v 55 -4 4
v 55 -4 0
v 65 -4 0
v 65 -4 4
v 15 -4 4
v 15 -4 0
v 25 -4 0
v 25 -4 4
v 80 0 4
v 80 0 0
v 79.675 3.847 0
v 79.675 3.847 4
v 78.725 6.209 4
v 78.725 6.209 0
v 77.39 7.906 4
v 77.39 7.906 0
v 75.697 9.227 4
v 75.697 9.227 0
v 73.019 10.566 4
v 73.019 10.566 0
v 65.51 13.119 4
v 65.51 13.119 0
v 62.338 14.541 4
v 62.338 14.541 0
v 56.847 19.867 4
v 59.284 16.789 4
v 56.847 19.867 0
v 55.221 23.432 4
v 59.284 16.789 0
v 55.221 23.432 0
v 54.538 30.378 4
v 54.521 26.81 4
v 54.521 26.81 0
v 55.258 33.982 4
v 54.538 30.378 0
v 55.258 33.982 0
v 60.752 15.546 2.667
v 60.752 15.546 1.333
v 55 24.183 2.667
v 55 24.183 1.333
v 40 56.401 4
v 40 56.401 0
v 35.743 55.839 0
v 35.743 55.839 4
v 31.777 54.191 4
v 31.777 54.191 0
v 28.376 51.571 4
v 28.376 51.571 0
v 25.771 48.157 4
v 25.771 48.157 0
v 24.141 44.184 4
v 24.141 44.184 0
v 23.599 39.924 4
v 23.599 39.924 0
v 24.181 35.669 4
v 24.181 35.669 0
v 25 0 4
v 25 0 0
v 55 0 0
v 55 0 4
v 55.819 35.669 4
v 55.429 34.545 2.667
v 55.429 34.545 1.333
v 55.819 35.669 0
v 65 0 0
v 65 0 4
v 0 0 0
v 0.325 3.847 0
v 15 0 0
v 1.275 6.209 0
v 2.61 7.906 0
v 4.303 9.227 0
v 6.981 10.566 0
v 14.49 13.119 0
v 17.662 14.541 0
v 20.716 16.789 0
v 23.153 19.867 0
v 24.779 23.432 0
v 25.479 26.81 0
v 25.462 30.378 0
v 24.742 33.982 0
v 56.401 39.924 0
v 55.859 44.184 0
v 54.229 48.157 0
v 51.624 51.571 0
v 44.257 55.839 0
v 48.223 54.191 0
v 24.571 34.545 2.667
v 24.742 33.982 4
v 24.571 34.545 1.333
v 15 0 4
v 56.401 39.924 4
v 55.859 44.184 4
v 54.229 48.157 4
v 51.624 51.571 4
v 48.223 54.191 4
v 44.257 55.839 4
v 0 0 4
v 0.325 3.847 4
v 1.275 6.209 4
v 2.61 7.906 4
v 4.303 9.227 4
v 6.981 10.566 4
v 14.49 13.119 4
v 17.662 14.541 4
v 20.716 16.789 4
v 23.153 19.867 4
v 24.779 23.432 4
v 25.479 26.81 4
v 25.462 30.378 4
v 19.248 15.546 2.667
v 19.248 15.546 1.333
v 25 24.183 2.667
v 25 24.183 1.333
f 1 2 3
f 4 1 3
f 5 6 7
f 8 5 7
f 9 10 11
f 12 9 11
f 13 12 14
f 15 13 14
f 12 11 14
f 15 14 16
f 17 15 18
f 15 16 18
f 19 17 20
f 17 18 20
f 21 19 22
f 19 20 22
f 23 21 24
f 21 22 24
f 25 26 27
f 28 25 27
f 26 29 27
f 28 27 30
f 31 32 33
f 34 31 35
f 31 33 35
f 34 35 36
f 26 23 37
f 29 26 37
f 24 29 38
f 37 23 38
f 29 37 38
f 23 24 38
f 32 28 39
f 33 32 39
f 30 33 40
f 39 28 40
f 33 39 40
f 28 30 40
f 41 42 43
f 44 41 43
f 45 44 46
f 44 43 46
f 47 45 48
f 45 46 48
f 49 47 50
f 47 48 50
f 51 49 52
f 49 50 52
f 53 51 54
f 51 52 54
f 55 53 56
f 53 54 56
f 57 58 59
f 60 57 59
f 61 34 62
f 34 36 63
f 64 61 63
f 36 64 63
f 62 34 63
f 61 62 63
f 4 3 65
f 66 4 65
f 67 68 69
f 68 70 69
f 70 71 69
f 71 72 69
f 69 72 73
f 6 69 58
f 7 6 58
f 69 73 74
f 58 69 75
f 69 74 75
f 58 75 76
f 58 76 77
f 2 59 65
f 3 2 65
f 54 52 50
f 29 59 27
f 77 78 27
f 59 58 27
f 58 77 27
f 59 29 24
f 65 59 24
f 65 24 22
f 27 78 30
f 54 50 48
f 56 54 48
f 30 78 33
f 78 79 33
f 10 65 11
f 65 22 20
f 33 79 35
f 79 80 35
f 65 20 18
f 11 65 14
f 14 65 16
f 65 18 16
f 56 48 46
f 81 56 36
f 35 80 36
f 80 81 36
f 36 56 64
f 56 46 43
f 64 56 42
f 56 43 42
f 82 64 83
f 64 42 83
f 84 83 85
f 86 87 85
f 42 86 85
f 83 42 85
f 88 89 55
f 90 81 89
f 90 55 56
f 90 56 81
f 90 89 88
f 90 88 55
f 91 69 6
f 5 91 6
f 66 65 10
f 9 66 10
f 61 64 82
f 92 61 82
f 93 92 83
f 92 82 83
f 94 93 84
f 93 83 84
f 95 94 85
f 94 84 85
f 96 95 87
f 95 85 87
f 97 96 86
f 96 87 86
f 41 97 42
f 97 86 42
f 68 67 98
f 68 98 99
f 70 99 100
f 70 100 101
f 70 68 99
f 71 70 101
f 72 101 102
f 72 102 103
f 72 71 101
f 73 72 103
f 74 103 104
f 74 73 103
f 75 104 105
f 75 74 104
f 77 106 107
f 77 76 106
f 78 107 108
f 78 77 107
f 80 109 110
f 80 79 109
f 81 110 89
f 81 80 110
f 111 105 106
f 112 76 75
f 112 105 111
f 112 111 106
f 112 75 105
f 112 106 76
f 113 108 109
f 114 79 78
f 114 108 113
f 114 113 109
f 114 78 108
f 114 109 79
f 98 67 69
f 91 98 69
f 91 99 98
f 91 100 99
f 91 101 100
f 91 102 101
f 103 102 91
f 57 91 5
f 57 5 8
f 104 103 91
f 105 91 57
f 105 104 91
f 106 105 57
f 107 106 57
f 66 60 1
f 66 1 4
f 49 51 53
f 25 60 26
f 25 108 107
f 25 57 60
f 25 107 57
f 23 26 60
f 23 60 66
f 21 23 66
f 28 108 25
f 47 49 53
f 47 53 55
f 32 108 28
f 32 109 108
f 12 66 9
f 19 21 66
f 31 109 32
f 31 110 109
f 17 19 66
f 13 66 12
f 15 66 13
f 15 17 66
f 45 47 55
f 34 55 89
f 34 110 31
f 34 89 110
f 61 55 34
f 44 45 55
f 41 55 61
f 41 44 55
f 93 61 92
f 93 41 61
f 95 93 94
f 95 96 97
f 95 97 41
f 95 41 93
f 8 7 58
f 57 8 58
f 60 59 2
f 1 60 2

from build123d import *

# Parameters (mm, degrees)
BOSS_EXTRUDE1_DEPTH = 4


with BuildPart() as part:
    # Sketch1 → Boss-Extrude1 (new body)
    with BuildSketch(Plane.XY):
        with BuildLine():
            ThreePointArc((55.819281992, 35.66920927), (53.03910268, 49.949232755), (40, 56.401385036))
            Line((40, 56.401385036), (40, 0))
            Line((40, 0), (55, 0))
            Line((55, 0), (55, -4))
            Line((55, -4), (65, -4))
            Line((65, -4), (65, 0))
            Line((65, 0), (80, 0))
            add(Edge.make_bspline(
                [(80, 0), (80.558151579, 12.429856436), (63.082498357, 9.400795532), (53.987736886, 23.874928316), (54.293563423, 30.674851608), (55.257577446, 33.982379076)],
                knots=[0, 0, 0, 0, 0.197688336, 0.274980814, 0.348282071, 0.348282071, 0.348282071, 0.348282071], degree=3))
            add(Edge.make_bspline(
                [(55.257577446, 33.982379076), (55.421541003, 34.544937251), (55.609085838, 35.107428191), (55.819281992, 35.66920927)],
                knots=[0.348282071, 0.348282071, 0.348282071, 0.348282071, 0.360749457, 0.360749457, 0.360749457, 0.360749457], degree=3))
        make_face()
        with BuildLine():
            add(Edge.make_bspline(
                [(0, 0), (-0.558151579, 12.429856436), (16.917501643, 9.400795532), (26.012263114, 23.874928316), (25.706436577, 30.674851608), (24.742422554, 33.982379076)],
                knots=[0, 0, 0, 0, 0.197688336, 0.274980814, 0.348282071, 0.348282071, 0.348282071, 0.348282071], degree=3))
            Line((0, 0), (15, 0))
            Line((15, 0), (15, -4))
            Line((15, -4), (25, -4))
            Line((25, -4), (25, 0))
            Line((25, 0), (40, 0))
            Line((40, 0), (40, 56.401385036))
            ThreePointArc((40, 56.401385036), (26.96089732, 49.949232755), (24.180718008, 35.66920927))
            add(Edge.make_bspline(
                [(24.742422554, 33.982379076), (24.578458997, 34.544937251), (24.390914162, 35.107428191), (24.180718008, 35.66920927)],
                knots=[0.348282071, 0.348282071, 0.348282071, 0.348282071, 0.360749457, 0.360749457, 0.360749457, 0.360749457], degree=3))
        make_face()
    extrude(amount=BOSS_EXTRUDE1_DEPTH)


solid = part.part
